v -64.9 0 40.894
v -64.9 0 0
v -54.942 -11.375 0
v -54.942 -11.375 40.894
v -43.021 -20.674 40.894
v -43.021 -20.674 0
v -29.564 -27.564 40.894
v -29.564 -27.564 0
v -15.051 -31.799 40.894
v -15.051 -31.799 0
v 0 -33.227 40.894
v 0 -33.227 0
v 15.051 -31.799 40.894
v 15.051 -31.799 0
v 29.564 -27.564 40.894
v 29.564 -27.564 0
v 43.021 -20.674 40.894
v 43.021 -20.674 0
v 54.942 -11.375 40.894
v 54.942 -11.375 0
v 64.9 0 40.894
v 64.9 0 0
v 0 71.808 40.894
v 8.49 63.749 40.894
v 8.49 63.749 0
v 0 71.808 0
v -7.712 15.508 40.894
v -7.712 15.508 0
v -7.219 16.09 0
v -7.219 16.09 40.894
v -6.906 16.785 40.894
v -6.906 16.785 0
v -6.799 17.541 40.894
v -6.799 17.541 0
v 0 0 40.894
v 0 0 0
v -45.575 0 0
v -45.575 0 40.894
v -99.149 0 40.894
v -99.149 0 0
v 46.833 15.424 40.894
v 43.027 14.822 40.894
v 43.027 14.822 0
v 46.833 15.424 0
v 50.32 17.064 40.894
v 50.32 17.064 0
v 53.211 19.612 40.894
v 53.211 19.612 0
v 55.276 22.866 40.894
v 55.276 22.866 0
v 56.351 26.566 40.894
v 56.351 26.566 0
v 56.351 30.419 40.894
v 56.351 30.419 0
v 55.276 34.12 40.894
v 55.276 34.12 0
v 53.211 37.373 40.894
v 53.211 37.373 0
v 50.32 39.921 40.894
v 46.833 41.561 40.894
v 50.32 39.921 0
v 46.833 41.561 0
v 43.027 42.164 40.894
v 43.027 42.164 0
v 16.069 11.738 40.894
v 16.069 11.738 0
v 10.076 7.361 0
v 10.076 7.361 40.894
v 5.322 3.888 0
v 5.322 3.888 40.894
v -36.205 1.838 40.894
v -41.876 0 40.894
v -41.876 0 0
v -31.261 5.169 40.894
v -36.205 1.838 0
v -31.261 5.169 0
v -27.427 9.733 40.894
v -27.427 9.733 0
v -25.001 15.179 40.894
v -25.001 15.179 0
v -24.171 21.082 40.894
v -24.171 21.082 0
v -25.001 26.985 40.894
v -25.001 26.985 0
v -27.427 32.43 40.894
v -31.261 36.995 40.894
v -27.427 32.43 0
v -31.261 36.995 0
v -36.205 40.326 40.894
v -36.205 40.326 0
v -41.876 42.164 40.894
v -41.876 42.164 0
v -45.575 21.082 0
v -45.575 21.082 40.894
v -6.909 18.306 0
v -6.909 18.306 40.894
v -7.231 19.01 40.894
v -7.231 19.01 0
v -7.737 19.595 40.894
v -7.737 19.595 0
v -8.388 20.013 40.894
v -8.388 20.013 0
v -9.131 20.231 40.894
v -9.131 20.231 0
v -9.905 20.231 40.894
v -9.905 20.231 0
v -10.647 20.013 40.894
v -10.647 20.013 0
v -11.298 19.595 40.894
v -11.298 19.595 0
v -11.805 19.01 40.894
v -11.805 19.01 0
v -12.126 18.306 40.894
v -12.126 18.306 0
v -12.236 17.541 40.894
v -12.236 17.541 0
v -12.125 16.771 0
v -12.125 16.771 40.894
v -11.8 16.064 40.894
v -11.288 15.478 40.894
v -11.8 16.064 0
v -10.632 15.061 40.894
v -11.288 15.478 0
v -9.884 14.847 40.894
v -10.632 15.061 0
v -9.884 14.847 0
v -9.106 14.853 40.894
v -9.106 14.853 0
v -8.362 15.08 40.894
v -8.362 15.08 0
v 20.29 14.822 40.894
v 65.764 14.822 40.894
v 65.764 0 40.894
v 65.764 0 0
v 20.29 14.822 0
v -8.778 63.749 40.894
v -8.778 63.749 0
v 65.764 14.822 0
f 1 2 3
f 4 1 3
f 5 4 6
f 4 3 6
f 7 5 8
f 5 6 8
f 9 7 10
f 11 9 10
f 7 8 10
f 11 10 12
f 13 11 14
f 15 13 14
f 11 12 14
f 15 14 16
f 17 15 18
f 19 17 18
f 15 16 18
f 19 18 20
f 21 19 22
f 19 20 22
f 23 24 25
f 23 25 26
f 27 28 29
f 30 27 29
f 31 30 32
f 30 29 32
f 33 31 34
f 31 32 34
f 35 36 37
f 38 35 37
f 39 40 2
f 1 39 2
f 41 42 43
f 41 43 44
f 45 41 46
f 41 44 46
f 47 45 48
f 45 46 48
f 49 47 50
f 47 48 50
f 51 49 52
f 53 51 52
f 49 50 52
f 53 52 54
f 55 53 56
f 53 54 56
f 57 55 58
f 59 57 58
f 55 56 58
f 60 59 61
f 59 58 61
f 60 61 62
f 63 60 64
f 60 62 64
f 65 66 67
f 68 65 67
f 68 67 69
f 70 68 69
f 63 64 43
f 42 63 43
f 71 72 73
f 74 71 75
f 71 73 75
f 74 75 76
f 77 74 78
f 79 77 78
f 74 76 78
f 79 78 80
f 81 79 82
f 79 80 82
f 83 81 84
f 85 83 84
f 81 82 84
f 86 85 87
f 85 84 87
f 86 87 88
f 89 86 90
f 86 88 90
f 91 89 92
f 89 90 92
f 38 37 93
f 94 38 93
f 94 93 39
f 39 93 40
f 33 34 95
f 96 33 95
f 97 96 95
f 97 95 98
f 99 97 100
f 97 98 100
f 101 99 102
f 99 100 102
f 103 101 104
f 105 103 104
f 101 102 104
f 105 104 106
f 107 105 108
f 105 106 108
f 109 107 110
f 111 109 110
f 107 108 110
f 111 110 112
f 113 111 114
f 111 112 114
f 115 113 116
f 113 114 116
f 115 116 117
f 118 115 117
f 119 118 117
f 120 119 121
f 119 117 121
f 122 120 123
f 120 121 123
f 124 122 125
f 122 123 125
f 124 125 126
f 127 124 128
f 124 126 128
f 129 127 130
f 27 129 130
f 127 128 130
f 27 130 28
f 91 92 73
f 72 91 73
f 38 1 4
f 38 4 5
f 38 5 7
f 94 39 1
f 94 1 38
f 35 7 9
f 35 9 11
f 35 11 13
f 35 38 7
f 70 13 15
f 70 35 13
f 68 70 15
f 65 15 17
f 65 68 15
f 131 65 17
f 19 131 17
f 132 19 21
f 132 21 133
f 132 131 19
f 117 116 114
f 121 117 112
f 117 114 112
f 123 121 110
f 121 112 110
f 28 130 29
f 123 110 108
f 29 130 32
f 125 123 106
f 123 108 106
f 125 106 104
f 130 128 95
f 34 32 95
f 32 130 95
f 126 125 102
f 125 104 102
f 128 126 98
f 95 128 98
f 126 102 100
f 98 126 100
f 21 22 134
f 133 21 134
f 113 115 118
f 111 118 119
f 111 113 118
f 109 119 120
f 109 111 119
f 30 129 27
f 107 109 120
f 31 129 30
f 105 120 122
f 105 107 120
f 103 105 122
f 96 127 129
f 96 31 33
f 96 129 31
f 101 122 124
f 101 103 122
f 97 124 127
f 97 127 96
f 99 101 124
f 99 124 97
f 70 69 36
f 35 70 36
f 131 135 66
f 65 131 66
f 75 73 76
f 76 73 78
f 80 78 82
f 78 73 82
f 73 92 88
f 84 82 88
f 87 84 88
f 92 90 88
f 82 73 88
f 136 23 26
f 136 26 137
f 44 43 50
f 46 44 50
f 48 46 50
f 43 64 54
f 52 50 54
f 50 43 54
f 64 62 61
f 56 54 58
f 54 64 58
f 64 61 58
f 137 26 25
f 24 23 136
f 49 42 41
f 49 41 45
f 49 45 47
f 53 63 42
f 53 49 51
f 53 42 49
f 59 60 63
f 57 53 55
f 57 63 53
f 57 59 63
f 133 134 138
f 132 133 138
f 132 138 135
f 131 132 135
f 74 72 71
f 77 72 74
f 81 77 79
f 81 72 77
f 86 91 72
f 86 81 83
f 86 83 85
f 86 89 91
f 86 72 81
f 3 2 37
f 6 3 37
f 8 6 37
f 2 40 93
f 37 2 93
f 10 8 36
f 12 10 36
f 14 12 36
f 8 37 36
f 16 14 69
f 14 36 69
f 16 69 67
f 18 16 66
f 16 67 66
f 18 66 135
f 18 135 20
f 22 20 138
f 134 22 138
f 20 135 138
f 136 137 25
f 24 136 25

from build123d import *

# Parameters (mm, degrees)
F1_DEPTH = 40.894


with BuildPart() as f1:
    # F0 (on Top) → F1 (new body)
    with BuildSketch(Plane.XY):
        with BuildLine():
            Line((-45.5752416326, 0), (-64.9001970887, 0))
            ThreePointArc((-64.9001970887, 0), (0, -33.2273267029), (64.9001970887, 0))
            Line((64.9001970887, 0), (64.6123960614, 0))
            Line((64.6123960614, 0), (64.0367791057, 0))
            Line((64.0367791057, 0), (20.290305838, 0))
            Line((20.290305838, 0), (0, 0))
            Line((0, 0), (-11.0560013884, 0))
            Line((-11.0560013884, 0), (-41.8757386506, 0))
            Line((-41.8757386506, 0), (-45.5752416326, 0))
        make_face()
        Polygon((64.6123960614, 0), (64.9001970887, 0), (65.7636150718, 0), (65.7636150718, 14.8219969124), (43.0269604549, 14.8219969124), (20.290305838, 14.8219969124), (20.290305838, 0), (64.0367791057, 0), align=None)
        Polygon((-99.1490855813, 0), (-64.9001970887, 0), (-45.5752416326, 0), (-45.5752416326, 21.0817717016), align=None)
        Polygon((5.3224623598, 3.8880399977), (20.290305838, 0), (10.0761194493, 7.3605697499), align=None)
        Polygon((5.3224623598, 3.8880399977), (0, 0), (20.290305838, 0), align=None)
        Polygon((16.0685388584, 11.7380110111), (20.290305838, 0), (20.290305838, 14.8219969124), align=None)
        Polygon((10.0761194493, 7.3605697499), (20.290305838, 0), (16.0685388584, 11.7380110111), align=None)
    extrude(amount=F1_DEPTH)


with BuildPart() as f1b:
    # F0 (on Top) → F1, piece 2 (new body)
    with BuildSketch(Plane.XY):
        with BuildLine():
            Line((-41.8757386506, 42.1635434031), (-41.8757386506, 0))
            ThreePointArc((-41.8757386506, 0), (-24.1713302987, 21.0817717016), (-41.8757386506, 42.1635434031))
        make_face()
    extrude(amount=F1_DEPTH)


with BuildPart() as f1c:
    # F0 (on Top) → F1, piece 3 (new body)
    with BuildSketch(Plane.XY):
        Polygon((-8.7780756876, 63.7489780784), (0, 63.7489780784), (8.4902700037, 63.7489780784), (0, 71.8075409532), align=None)
    extrude(amount=F1_DEPTH)


with BuildPart() as f1d:
    # F0 (on Top) → F1, piece 4 (new body)
    with BuildSketch(Plane.XY):
        with BuildLine():
            Line((43.0269604549, 42.1635434031), (43.0269604549, 14.8219969124))
            ThreePointArc((43.0269604549, 14.8219969124), (56.4873108865, 28.4927701578), (43.0269604549, 42.1635434031))
        make_face()
    extrude(amount=F1_DEPTH)


with BuildPart() as f1e:
    # F0 (on Top) → F1, piece 5 (new body)
    with BuildSketch(Plane.XY):
        with BuildLine():
            ThreePointArc((-6.7990865358, 17.5405594115), (-9.5176490349, 20.2591219106), (-12.2362115341, 17.5405594115))
            ThreePointArc((-12.2362115341, 17.5405594115), (-10.6316712171, 15.0607334823), (-7.7121024571, 15.5081756837))
            ThreePointArc((-7.7121024571, 15.5081756837), (-7.0378231057, 16.4265372293), (-6.7990865358, 17.5405594115))
        make_face()
    extrude(amount=F1_DEPTH)


solid = Compound([f1.part, f1b.part, f1c.part, f1d.part, f1e.part])
